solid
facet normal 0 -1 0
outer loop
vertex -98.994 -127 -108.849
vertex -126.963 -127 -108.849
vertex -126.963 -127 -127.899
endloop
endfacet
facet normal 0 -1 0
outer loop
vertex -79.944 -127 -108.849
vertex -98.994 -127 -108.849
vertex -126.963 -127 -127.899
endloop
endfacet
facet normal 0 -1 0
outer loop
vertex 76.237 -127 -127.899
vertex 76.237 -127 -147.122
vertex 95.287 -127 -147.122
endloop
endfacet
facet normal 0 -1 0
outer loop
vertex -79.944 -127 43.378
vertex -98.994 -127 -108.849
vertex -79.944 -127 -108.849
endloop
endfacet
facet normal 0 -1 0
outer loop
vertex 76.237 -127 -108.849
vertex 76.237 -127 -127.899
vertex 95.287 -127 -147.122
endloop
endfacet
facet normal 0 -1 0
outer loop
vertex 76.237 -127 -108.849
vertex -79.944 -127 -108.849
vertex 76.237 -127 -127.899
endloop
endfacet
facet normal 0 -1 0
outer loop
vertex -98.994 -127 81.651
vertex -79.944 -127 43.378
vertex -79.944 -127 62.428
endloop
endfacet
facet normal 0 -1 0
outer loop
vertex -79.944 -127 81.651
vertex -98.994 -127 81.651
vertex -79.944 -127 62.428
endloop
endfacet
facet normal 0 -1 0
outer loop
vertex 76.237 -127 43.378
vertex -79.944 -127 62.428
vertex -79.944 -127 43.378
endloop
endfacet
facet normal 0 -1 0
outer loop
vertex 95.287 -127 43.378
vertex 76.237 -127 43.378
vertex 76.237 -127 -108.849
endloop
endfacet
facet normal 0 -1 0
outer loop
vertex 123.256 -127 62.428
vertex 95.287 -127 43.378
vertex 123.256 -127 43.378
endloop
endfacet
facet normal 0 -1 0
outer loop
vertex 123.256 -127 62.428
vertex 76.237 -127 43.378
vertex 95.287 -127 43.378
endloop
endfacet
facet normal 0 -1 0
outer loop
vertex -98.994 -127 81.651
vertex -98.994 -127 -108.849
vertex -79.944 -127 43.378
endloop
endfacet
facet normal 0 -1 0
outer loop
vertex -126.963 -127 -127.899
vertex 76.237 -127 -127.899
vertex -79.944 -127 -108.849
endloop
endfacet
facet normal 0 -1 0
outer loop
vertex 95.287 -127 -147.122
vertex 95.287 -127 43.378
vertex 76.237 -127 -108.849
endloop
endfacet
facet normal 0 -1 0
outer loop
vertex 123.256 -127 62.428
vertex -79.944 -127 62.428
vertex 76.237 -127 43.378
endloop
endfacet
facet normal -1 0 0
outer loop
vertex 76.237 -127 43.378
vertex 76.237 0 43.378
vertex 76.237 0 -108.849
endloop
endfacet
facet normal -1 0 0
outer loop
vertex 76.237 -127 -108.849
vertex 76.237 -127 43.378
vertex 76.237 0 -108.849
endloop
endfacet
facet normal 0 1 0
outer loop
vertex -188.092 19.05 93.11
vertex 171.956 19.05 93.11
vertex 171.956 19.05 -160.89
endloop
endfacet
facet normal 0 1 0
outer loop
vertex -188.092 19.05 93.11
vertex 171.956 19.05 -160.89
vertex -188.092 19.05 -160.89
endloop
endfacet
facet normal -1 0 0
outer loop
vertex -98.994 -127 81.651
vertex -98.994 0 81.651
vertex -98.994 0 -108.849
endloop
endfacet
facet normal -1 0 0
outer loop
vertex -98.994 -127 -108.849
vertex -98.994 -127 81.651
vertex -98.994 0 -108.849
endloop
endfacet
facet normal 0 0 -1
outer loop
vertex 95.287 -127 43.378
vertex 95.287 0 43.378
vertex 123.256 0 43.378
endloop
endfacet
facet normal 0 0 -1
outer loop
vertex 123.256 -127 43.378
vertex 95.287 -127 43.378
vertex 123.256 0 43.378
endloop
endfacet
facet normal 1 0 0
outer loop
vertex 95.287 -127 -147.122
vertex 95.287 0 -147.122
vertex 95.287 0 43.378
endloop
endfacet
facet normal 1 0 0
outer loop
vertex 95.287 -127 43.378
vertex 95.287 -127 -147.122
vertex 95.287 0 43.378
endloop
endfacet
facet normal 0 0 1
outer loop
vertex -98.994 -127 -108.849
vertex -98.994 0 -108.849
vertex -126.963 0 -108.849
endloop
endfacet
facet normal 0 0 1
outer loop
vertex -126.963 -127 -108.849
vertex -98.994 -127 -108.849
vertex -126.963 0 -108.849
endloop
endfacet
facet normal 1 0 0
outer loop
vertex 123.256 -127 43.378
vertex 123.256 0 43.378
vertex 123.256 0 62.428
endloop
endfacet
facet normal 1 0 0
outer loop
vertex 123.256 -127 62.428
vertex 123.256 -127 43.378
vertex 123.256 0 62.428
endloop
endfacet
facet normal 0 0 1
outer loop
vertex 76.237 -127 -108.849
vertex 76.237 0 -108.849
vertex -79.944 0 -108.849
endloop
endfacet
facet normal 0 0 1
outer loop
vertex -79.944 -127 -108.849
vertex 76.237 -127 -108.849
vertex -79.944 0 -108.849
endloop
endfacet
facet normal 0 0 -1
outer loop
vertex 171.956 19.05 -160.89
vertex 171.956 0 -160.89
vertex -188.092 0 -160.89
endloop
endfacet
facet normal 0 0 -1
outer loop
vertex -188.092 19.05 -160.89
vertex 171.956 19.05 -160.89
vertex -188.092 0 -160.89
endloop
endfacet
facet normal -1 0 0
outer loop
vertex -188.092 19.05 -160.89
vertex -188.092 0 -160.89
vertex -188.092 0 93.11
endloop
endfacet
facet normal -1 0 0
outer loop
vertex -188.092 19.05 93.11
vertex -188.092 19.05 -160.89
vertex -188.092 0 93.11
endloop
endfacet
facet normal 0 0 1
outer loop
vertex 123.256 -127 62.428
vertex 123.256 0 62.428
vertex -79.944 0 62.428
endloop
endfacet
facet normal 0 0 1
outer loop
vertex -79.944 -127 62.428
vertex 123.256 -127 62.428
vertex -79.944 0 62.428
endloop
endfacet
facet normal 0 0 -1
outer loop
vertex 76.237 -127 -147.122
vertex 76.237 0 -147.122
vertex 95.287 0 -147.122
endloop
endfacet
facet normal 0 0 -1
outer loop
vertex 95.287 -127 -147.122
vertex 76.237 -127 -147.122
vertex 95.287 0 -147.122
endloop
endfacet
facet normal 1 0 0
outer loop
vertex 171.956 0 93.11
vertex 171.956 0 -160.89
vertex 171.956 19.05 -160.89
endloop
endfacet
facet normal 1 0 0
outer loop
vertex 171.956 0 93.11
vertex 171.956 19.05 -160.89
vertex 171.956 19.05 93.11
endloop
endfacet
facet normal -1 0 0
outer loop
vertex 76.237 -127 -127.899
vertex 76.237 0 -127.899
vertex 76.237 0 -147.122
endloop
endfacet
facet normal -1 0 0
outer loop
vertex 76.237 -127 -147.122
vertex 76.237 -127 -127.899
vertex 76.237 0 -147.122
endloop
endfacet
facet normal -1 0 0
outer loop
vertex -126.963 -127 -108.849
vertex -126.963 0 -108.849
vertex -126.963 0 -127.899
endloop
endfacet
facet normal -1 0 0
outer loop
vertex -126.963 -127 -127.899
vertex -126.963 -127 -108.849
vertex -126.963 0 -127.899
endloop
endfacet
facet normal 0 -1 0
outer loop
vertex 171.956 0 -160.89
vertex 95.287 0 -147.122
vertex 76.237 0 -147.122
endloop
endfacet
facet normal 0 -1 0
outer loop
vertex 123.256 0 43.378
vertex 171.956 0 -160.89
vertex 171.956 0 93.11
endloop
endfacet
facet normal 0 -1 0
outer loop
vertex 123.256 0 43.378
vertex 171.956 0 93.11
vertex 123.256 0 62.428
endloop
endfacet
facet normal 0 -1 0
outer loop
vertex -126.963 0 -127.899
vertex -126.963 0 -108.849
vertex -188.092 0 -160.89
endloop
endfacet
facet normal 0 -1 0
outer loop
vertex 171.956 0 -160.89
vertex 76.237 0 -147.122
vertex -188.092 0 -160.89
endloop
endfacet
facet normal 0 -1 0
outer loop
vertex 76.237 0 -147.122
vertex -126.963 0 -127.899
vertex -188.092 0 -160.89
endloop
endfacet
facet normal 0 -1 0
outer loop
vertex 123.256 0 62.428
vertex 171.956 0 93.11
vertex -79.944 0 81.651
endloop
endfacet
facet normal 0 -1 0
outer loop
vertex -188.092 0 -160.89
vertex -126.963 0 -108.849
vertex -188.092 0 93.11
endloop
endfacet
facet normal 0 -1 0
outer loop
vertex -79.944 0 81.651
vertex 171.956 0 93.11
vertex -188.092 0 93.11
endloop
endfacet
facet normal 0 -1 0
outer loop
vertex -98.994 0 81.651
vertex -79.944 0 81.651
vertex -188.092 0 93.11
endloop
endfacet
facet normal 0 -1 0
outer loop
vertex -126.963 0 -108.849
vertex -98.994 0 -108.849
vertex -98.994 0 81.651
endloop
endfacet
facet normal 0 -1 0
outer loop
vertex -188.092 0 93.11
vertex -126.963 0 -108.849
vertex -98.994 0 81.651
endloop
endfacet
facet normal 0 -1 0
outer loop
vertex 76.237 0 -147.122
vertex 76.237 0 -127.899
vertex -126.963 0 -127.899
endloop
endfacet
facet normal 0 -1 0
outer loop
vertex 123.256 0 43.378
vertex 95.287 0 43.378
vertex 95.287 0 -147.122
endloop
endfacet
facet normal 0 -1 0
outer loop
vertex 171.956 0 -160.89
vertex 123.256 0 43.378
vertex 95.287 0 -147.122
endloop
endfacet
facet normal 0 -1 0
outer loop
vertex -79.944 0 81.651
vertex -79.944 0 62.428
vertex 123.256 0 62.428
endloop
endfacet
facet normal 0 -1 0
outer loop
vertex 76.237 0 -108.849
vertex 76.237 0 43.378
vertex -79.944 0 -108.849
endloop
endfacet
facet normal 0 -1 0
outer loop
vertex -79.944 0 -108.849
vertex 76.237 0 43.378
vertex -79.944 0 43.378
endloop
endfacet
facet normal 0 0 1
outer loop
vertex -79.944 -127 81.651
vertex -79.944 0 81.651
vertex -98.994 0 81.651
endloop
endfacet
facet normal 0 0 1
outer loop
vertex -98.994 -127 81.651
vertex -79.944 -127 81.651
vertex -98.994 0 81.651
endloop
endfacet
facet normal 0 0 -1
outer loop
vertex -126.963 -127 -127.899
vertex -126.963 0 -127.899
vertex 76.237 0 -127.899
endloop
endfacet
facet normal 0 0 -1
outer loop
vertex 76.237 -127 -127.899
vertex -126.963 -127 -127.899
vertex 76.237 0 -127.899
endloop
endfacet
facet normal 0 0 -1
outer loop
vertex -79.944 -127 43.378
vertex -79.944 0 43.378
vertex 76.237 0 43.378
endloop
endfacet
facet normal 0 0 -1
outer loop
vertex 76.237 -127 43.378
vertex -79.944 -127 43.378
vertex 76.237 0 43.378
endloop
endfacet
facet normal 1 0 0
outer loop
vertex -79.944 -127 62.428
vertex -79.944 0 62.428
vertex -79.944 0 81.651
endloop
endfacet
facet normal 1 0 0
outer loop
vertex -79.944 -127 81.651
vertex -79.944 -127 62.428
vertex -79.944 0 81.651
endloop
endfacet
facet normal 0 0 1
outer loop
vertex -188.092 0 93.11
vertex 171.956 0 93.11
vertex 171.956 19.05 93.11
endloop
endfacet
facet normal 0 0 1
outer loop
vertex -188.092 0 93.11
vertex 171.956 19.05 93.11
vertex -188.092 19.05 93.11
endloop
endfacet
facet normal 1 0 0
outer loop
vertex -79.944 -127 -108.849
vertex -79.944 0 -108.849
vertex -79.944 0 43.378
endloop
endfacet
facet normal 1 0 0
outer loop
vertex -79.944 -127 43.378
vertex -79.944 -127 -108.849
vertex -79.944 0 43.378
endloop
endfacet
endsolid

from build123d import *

# Parameters (mm, degrees)
F1_DEPTH = 127
F2_W     = 360.047168
F2_H     = 254
F3_DEPTH = 19.05


with BuildPart() as f1:
    # F0 (on Front) → F1 (new body)
    with BuildSketch(Plane.XZ):
        Polygon((-79.94371, 81.650516), (-98.99371, 81.650516), (-98.99371, -108.849484), (-79.94371, -108.849484), (-79.94371, 43.378164), (-79.94371, 62.428164), align=None)
        Polygon((123.25629, 62.428164), (-79.94371, 62.428164), (-79.94371, 43.378164), (76.237486, 43.378164), (95.287486, 43.378164), (123.25629, 43.378164), align=None)
        Polygon((76.237486, 43.378164), (76.237486, -108.849484), (76.237486, -127.899484), (76.237486, -147.121836), (95.287486, -147.121836), (95.287486, 43.378164), align=None)
        Polygon((-79.94371, -108.849484), (-98.99371, -108.849484), (-126.962514, -108.849484), (-126.962514, -127.899484), (76.237486, -127.899484), (76.237486, -108.849484), align=None)
    extrude(amount=F1_DEPTH)

    # F2 (on face) → F3 (join)
    with BuildSketch(Plane(origin=(0, 0, 0), x_dir=(-1, 0, 0), z_dir=(0, 1, 0))):
        with Locations((8.068025, -33.890009)):
            Rectangle(F2_W, F2_H)
    extrude(amount=F3_DEPTH)


solid = f1.part
